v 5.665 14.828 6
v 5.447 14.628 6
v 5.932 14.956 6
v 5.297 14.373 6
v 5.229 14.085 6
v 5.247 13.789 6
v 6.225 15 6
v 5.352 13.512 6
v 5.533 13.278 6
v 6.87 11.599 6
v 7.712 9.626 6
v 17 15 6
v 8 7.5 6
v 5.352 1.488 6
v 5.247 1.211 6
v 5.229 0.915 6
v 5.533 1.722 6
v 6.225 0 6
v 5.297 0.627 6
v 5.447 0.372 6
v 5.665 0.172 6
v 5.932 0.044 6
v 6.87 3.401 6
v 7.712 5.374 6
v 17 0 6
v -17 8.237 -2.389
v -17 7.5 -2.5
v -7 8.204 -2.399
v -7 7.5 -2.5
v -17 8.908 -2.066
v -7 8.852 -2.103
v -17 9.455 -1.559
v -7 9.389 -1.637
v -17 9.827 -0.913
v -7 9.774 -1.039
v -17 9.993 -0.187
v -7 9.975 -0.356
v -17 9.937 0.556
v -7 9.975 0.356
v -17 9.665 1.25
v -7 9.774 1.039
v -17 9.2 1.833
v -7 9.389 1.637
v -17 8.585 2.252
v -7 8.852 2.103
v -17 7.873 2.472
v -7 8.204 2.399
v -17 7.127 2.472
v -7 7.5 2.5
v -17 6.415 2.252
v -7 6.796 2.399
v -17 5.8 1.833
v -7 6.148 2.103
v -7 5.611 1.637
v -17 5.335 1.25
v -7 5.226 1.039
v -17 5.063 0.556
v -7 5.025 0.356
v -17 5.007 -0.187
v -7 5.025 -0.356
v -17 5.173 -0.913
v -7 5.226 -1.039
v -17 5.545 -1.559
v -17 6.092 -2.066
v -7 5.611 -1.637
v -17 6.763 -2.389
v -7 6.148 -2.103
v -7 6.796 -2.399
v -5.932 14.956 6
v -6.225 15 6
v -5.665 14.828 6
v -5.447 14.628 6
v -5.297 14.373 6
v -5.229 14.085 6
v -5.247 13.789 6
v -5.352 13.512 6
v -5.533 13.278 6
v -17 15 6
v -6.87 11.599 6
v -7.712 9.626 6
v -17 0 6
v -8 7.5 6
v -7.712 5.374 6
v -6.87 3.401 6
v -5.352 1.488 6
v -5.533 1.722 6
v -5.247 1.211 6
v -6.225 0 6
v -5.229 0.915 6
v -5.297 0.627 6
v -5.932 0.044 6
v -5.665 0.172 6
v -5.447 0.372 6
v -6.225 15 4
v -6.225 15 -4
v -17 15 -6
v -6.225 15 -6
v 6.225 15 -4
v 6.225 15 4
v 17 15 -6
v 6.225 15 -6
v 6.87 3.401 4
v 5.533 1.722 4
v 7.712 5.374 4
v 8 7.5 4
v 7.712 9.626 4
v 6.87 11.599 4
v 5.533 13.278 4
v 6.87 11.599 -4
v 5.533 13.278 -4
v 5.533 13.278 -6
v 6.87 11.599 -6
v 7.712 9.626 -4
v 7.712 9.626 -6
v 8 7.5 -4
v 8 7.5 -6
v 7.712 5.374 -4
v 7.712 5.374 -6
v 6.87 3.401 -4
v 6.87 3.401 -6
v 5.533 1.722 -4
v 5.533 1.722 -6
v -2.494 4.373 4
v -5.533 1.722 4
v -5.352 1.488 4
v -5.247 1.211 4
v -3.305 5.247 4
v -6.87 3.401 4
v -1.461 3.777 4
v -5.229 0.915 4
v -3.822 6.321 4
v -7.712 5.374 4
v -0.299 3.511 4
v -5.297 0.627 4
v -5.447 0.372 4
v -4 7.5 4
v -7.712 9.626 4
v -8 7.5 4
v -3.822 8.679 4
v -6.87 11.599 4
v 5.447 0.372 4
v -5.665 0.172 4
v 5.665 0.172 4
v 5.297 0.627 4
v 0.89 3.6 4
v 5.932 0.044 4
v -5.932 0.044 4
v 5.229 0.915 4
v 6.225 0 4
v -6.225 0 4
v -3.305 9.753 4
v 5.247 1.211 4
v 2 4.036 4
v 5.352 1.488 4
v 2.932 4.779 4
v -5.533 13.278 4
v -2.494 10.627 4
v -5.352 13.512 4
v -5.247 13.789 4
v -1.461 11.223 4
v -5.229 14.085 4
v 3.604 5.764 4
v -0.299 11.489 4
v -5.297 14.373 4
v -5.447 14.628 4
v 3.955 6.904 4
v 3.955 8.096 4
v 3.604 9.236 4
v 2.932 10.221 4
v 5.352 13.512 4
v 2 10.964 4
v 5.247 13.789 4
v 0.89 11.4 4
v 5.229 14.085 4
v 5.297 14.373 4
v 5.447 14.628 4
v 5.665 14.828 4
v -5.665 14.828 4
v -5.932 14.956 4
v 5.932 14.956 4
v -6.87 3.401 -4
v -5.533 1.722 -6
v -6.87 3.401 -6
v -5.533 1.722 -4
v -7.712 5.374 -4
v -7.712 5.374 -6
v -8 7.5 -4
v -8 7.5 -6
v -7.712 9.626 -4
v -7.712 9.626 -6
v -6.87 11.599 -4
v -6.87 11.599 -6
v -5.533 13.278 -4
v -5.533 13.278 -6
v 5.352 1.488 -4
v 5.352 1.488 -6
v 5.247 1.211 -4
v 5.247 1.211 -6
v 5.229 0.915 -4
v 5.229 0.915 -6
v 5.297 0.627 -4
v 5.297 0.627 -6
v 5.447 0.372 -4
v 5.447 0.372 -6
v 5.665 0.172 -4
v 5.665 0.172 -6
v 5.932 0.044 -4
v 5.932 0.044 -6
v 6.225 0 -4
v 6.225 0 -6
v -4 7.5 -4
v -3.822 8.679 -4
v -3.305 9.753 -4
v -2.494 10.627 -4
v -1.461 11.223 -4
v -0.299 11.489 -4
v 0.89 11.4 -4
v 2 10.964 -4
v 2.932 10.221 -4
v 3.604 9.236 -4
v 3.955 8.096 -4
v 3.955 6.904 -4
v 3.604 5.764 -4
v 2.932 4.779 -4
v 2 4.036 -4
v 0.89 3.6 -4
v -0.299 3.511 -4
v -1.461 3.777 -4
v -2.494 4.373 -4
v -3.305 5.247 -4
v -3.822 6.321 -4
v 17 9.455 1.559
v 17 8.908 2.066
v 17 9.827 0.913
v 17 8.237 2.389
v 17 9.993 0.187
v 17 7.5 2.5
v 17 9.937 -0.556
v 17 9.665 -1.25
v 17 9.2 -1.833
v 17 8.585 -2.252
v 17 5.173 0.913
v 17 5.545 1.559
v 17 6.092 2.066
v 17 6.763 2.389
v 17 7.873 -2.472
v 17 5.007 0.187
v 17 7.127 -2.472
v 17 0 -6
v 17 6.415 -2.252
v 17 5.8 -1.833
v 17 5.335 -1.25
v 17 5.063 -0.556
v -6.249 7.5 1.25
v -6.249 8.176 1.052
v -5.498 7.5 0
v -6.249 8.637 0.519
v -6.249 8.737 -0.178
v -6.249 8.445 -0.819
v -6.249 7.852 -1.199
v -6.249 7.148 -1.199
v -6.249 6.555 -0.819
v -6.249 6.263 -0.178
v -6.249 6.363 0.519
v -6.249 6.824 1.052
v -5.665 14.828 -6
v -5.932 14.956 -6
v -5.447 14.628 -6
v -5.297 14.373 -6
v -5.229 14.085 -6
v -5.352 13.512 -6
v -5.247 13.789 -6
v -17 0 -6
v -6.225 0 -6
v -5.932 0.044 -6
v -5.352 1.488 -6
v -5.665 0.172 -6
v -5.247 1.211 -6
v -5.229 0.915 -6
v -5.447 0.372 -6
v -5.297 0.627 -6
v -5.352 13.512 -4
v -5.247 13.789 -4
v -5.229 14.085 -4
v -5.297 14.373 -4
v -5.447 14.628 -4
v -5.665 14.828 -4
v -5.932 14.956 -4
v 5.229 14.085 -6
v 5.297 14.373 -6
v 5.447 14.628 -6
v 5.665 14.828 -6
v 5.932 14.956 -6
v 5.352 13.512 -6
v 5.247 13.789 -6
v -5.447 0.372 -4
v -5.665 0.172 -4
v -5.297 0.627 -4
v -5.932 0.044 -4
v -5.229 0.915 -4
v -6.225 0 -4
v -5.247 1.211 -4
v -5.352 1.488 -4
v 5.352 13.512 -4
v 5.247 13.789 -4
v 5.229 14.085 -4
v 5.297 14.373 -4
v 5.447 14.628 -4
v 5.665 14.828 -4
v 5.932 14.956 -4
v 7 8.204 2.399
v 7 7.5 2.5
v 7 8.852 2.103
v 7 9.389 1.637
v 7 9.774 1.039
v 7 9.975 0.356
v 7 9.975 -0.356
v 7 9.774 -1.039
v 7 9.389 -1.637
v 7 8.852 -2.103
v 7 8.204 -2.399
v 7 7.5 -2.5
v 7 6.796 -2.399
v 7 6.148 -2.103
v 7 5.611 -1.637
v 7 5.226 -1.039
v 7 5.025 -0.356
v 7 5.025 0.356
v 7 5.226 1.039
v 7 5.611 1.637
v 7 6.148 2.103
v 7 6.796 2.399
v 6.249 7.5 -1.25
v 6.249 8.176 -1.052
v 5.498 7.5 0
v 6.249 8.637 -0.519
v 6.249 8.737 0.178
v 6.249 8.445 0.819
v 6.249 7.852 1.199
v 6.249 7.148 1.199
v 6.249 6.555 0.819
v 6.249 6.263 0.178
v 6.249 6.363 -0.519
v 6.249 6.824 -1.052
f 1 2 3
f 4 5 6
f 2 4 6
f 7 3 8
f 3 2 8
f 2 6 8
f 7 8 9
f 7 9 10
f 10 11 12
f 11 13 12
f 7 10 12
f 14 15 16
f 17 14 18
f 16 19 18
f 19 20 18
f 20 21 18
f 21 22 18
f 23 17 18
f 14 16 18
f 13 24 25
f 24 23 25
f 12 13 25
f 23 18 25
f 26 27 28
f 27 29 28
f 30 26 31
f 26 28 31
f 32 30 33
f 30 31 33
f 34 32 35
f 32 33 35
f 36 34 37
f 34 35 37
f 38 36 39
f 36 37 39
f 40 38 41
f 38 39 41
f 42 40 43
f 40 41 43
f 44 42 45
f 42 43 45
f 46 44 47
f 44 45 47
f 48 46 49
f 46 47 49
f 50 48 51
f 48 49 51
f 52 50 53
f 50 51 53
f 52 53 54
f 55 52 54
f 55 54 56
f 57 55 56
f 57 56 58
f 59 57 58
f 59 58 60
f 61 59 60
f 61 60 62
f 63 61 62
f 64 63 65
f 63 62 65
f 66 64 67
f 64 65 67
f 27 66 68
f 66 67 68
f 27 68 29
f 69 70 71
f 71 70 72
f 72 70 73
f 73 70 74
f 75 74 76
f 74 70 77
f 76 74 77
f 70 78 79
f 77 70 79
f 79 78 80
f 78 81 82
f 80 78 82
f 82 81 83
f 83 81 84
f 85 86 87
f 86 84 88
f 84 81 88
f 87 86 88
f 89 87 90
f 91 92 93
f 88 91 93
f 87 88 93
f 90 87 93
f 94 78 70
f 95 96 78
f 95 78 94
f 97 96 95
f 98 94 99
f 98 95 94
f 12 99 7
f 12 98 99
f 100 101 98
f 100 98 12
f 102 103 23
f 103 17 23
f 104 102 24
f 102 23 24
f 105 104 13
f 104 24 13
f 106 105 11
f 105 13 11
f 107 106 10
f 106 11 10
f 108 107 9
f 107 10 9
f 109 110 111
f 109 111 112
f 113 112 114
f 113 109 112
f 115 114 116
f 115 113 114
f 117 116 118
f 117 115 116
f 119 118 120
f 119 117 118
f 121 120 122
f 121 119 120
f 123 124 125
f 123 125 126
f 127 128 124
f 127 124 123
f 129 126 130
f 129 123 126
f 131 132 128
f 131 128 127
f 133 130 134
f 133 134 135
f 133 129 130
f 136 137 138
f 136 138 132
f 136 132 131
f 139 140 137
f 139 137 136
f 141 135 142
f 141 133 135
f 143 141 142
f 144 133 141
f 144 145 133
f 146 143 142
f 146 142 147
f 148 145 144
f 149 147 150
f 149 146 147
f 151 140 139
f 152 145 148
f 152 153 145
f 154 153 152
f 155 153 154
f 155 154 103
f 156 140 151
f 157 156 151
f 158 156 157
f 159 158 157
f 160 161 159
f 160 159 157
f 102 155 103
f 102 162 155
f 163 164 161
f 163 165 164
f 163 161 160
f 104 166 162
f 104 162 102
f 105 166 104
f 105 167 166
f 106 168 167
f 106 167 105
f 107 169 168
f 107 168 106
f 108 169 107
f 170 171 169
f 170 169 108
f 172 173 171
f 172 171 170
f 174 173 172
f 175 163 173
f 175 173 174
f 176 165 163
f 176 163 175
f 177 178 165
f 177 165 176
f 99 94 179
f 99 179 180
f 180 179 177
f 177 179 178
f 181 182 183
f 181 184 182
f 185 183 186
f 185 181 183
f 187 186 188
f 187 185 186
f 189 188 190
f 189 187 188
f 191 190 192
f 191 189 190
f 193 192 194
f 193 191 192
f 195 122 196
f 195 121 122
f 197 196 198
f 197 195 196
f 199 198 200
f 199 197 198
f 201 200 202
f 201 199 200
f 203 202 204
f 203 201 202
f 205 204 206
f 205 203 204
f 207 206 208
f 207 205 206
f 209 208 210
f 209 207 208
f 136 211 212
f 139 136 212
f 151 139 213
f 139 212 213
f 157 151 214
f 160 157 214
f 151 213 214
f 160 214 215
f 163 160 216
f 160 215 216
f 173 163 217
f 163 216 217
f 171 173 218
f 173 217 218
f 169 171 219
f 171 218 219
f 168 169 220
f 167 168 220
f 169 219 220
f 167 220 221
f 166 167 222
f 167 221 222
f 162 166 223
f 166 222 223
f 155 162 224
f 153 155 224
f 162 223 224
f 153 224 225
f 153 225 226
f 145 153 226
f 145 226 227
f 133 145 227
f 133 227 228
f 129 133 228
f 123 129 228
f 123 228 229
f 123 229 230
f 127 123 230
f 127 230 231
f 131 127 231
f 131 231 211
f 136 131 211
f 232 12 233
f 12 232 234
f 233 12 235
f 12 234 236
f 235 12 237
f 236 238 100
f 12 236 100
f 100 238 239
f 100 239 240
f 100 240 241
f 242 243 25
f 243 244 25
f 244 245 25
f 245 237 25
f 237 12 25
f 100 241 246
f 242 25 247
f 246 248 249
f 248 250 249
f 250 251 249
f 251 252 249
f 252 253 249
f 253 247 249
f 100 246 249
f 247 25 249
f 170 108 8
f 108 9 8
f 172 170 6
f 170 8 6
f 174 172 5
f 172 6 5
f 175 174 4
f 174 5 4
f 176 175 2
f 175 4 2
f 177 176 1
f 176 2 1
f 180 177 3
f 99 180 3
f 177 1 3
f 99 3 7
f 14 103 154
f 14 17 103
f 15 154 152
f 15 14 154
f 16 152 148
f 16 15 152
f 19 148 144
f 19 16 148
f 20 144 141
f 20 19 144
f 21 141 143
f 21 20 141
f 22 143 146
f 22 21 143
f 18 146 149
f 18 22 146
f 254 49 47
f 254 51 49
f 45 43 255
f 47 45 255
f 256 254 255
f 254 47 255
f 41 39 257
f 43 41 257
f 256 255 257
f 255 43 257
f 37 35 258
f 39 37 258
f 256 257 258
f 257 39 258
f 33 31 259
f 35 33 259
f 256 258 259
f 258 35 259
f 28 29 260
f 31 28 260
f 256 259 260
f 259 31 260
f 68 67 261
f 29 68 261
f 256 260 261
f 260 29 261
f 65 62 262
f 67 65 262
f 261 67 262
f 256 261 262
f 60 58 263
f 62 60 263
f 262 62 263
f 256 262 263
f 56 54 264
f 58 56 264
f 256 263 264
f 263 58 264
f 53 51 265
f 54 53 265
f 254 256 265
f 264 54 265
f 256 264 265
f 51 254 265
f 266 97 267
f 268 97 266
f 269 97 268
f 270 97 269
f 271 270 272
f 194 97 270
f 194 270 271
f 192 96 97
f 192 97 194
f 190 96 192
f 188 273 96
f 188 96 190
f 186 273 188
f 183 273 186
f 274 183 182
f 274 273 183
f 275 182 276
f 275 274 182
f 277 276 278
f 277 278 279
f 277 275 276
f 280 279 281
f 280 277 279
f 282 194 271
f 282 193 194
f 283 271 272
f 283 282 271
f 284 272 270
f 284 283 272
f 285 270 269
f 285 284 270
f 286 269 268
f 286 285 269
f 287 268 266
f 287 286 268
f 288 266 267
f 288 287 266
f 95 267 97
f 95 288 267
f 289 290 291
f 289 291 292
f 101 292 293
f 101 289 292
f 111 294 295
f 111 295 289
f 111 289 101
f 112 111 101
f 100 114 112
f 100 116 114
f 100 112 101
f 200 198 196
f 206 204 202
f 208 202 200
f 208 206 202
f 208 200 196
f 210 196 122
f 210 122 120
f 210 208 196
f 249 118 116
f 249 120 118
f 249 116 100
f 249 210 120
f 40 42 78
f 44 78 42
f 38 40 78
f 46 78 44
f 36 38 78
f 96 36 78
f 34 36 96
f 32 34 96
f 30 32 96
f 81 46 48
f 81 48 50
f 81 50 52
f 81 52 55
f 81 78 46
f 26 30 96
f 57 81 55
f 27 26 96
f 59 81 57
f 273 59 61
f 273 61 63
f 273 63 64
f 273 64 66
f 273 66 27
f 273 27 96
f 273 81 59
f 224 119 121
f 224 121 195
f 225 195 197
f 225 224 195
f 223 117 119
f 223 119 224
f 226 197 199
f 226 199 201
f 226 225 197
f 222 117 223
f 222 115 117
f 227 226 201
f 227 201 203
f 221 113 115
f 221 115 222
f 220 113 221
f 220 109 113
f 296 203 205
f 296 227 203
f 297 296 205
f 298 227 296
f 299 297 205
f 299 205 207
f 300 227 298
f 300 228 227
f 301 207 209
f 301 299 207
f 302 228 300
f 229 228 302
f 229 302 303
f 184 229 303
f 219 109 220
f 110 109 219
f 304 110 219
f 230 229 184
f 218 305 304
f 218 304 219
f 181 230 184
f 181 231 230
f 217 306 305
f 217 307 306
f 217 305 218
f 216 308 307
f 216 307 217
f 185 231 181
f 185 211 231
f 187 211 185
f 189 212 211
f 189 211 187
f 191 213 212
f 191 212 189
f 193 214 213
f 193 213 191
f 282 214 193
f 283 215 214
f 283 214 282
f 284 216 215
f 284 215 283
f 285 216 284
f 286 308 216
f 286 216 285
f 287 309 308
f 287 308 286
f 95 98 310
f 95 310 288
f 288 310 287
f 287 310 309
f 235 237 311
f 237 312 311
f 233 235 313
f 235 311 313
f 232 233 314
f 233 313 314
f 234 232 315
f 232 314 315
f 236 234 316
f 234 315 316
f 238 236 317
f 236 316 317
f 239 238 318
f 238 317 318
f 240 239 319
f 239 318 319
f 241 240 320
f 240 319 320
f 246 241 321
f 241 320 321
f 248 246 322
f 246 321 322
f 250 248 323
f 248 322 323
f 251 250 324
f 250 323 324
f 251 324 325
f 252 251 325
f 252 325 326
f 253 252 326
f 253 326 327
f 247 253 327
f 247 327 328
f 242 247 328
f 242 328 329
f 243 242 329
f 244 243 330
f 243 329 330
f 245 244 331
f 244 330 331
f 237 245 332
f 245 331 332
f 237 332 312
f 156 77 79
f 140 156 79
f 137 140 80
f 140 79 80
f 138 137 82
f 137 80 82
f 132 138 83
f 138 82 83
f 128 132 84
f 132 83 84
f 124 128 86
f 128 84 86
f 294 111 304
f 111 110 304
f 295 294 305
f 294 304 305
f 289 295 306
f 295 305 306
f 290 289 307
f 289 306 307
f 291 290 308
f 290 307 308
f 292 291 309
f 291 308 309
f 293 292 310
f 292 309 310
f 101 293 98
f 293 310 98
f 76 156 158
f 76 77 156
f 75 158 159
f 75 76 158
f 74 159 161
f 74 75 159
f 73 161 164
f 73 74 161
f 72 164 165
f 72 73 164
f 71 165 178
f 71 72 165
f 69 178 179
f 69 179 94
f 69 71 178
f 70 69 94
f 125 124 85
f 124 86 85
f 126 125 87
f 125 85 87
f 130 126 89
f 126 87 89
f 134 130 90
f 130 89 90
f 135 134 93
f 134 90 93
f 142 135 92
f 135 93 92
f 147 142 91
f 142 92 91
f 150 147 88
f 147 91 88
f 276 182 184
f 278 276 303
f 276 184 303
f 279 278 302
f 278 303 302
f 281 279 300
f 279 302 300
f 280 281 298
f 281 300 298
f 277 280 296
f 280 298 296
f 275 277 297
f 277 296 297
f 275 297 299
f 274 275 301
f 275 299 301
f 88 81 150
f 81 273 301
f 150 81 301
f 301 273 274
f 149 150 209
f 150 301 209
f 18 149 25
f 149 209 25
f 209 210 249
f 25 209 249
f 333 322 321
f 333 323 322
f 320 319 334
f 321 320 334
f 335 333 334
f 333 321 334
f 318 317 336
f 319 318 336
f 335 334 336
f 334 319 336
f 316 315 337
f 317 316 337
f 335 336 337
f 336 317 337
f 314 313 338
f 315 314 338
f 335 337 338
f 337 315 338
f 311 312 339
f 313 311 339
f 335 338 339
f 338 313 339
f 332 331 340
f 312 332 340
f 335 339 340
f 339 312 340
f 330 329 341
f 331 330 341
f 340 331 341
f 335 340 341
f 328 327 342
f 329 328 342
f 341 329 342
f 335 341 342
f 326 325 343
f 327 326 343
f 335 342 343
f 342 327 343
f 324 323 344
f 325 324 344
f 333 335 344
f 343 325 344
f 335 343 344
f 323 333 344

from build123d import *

# Parameters (mm, degrees)
SKETCH_1_W          = 34
SKETCH_1_H          = 12
EXTRUDE_1_DEPTH     = 15
SKETCH_2_R          = 4
CUT_EXTRUDE_1_DEPTH = 26.651510677
M6X1_0_2_D          = 5
M6X1_0_2_DEPTH      = 10
M6X1_0_2_TIP        = 1.502151548
M6X1_0_1_D          = 5
M6X1_0_1_DEPTH      = 10
M6X1_0_1_TIP        = 1.502151548
SKETCH_11_R         = 8
CUT_EXTRUDE_2_DEPTH = 2
CUT_EXTRUDE_START   = -2
SKETCH_12_R         = 8
CUT_EXTRUDE_3_DEPTH = 2
FILLET_1_R          = 1


with BuildPart() as part:
    # 草图1 → 凸台-拉伸1 (new body)
    with BuildSketch(Plane(origin=(0, 0, 0), x_dir=(1, 0, 0), z_dir=(0, 1, 0))):
        Rectangle(SKETCH_1_W, SKETCH_1_H)
    extrude(amount=EXTRUDE_1_DEPTH)

    # 草图2 → 切除-拉伸1 (cut, through all)
    with BuildSketch(Plane(origin=(0, 0, -6), x_dir=(-1, 0, 0), z_dir=(0, 0, -1))):
        with Locations((0, 7.5)):
            Circle(SKETCH_2_R)
    extrude(amount=-CUT_EXTRUDE_1_DEPTH, mode=Mode.SUBTRACT)

    # M6x1.0 螺纹孔2
    with Locations(Plane.ZY.offset(17)):
        with Locations((0, 7.5)):
            Hole(M6X1_0_2_D / 2, depth=M6X1_0_2_DEPTH)
            with Locations((0, 0, -(M6X1_0_2_DEPTH + M6X1_0_2_TIP / 2))):  # 118° drill point
                Cone(0, M6X1_0_2_D / 2, M6X1_0_2_TIP, mode=Mode.SUBTRACT)

    # M6x1.0 螺纹孔1
    with Locations(Plane(origin=(17, 0, 0), x_dir=(0, 0, -1), z_dir=(1, 0, 0))):
        with Locations((0, 7.5)):
            Hole(M6X1_0_1_D / 2, depth=M6X1_0_1_DEPTH)
            with Locations((0, 0, -(M6X1_0_1_DEPTH + M6X1_0_1_TIP / 2))):  # 118° drill point
                Cone(0, M6X1_0_1_D / 2, M6X1_0_1_TIP, mode=Mode.SUBTRACT)

    # 草图11 → 切除-拉伸2 (cut)
    with BuildSketch(Plane.XY.offset(6)):
        with Locations((0, 7.5)):
            Circle(SKETCH_11_R)
    extrude(amount=-CUT_EXTRUDE_2_DEPTH, mode=Mode.SUBTRACT)

    # 草图12 → 切除-拉伸3 (cut)
    with BuildSketch(Plane(origin=(0, 0, -6), x_dir=(-1, 0, 0), z_dir=(0, 0, -1)).offset(CUT_EXTRUDE_START)):
        with Locations((0, 7.5)):
            Circle(SKETCH_12_R)
    extrude(amount=CUT_EXTRUDE_3_DEPTH, mode=Mode.SUBTRACT)

    # 圆角1
    fillet_1_edges = [part.edges().sort_by_distance(p)[0] for p in [
        (2.783882181, 0, 5),
        (-2.783882181, 0, 5),
        (-2.783882181, 15, 5),
        (2.783882181, 15, 5),
        (-2.783882181, 0, -5),
        (2.783882181, 0, -5),
        (2.783882181, 15, -5),
        (-2.783882181, 15, -5),
    ]]
    fillet(fillet_1_edges, radius=FILLET_1_R)


solid = part.part
